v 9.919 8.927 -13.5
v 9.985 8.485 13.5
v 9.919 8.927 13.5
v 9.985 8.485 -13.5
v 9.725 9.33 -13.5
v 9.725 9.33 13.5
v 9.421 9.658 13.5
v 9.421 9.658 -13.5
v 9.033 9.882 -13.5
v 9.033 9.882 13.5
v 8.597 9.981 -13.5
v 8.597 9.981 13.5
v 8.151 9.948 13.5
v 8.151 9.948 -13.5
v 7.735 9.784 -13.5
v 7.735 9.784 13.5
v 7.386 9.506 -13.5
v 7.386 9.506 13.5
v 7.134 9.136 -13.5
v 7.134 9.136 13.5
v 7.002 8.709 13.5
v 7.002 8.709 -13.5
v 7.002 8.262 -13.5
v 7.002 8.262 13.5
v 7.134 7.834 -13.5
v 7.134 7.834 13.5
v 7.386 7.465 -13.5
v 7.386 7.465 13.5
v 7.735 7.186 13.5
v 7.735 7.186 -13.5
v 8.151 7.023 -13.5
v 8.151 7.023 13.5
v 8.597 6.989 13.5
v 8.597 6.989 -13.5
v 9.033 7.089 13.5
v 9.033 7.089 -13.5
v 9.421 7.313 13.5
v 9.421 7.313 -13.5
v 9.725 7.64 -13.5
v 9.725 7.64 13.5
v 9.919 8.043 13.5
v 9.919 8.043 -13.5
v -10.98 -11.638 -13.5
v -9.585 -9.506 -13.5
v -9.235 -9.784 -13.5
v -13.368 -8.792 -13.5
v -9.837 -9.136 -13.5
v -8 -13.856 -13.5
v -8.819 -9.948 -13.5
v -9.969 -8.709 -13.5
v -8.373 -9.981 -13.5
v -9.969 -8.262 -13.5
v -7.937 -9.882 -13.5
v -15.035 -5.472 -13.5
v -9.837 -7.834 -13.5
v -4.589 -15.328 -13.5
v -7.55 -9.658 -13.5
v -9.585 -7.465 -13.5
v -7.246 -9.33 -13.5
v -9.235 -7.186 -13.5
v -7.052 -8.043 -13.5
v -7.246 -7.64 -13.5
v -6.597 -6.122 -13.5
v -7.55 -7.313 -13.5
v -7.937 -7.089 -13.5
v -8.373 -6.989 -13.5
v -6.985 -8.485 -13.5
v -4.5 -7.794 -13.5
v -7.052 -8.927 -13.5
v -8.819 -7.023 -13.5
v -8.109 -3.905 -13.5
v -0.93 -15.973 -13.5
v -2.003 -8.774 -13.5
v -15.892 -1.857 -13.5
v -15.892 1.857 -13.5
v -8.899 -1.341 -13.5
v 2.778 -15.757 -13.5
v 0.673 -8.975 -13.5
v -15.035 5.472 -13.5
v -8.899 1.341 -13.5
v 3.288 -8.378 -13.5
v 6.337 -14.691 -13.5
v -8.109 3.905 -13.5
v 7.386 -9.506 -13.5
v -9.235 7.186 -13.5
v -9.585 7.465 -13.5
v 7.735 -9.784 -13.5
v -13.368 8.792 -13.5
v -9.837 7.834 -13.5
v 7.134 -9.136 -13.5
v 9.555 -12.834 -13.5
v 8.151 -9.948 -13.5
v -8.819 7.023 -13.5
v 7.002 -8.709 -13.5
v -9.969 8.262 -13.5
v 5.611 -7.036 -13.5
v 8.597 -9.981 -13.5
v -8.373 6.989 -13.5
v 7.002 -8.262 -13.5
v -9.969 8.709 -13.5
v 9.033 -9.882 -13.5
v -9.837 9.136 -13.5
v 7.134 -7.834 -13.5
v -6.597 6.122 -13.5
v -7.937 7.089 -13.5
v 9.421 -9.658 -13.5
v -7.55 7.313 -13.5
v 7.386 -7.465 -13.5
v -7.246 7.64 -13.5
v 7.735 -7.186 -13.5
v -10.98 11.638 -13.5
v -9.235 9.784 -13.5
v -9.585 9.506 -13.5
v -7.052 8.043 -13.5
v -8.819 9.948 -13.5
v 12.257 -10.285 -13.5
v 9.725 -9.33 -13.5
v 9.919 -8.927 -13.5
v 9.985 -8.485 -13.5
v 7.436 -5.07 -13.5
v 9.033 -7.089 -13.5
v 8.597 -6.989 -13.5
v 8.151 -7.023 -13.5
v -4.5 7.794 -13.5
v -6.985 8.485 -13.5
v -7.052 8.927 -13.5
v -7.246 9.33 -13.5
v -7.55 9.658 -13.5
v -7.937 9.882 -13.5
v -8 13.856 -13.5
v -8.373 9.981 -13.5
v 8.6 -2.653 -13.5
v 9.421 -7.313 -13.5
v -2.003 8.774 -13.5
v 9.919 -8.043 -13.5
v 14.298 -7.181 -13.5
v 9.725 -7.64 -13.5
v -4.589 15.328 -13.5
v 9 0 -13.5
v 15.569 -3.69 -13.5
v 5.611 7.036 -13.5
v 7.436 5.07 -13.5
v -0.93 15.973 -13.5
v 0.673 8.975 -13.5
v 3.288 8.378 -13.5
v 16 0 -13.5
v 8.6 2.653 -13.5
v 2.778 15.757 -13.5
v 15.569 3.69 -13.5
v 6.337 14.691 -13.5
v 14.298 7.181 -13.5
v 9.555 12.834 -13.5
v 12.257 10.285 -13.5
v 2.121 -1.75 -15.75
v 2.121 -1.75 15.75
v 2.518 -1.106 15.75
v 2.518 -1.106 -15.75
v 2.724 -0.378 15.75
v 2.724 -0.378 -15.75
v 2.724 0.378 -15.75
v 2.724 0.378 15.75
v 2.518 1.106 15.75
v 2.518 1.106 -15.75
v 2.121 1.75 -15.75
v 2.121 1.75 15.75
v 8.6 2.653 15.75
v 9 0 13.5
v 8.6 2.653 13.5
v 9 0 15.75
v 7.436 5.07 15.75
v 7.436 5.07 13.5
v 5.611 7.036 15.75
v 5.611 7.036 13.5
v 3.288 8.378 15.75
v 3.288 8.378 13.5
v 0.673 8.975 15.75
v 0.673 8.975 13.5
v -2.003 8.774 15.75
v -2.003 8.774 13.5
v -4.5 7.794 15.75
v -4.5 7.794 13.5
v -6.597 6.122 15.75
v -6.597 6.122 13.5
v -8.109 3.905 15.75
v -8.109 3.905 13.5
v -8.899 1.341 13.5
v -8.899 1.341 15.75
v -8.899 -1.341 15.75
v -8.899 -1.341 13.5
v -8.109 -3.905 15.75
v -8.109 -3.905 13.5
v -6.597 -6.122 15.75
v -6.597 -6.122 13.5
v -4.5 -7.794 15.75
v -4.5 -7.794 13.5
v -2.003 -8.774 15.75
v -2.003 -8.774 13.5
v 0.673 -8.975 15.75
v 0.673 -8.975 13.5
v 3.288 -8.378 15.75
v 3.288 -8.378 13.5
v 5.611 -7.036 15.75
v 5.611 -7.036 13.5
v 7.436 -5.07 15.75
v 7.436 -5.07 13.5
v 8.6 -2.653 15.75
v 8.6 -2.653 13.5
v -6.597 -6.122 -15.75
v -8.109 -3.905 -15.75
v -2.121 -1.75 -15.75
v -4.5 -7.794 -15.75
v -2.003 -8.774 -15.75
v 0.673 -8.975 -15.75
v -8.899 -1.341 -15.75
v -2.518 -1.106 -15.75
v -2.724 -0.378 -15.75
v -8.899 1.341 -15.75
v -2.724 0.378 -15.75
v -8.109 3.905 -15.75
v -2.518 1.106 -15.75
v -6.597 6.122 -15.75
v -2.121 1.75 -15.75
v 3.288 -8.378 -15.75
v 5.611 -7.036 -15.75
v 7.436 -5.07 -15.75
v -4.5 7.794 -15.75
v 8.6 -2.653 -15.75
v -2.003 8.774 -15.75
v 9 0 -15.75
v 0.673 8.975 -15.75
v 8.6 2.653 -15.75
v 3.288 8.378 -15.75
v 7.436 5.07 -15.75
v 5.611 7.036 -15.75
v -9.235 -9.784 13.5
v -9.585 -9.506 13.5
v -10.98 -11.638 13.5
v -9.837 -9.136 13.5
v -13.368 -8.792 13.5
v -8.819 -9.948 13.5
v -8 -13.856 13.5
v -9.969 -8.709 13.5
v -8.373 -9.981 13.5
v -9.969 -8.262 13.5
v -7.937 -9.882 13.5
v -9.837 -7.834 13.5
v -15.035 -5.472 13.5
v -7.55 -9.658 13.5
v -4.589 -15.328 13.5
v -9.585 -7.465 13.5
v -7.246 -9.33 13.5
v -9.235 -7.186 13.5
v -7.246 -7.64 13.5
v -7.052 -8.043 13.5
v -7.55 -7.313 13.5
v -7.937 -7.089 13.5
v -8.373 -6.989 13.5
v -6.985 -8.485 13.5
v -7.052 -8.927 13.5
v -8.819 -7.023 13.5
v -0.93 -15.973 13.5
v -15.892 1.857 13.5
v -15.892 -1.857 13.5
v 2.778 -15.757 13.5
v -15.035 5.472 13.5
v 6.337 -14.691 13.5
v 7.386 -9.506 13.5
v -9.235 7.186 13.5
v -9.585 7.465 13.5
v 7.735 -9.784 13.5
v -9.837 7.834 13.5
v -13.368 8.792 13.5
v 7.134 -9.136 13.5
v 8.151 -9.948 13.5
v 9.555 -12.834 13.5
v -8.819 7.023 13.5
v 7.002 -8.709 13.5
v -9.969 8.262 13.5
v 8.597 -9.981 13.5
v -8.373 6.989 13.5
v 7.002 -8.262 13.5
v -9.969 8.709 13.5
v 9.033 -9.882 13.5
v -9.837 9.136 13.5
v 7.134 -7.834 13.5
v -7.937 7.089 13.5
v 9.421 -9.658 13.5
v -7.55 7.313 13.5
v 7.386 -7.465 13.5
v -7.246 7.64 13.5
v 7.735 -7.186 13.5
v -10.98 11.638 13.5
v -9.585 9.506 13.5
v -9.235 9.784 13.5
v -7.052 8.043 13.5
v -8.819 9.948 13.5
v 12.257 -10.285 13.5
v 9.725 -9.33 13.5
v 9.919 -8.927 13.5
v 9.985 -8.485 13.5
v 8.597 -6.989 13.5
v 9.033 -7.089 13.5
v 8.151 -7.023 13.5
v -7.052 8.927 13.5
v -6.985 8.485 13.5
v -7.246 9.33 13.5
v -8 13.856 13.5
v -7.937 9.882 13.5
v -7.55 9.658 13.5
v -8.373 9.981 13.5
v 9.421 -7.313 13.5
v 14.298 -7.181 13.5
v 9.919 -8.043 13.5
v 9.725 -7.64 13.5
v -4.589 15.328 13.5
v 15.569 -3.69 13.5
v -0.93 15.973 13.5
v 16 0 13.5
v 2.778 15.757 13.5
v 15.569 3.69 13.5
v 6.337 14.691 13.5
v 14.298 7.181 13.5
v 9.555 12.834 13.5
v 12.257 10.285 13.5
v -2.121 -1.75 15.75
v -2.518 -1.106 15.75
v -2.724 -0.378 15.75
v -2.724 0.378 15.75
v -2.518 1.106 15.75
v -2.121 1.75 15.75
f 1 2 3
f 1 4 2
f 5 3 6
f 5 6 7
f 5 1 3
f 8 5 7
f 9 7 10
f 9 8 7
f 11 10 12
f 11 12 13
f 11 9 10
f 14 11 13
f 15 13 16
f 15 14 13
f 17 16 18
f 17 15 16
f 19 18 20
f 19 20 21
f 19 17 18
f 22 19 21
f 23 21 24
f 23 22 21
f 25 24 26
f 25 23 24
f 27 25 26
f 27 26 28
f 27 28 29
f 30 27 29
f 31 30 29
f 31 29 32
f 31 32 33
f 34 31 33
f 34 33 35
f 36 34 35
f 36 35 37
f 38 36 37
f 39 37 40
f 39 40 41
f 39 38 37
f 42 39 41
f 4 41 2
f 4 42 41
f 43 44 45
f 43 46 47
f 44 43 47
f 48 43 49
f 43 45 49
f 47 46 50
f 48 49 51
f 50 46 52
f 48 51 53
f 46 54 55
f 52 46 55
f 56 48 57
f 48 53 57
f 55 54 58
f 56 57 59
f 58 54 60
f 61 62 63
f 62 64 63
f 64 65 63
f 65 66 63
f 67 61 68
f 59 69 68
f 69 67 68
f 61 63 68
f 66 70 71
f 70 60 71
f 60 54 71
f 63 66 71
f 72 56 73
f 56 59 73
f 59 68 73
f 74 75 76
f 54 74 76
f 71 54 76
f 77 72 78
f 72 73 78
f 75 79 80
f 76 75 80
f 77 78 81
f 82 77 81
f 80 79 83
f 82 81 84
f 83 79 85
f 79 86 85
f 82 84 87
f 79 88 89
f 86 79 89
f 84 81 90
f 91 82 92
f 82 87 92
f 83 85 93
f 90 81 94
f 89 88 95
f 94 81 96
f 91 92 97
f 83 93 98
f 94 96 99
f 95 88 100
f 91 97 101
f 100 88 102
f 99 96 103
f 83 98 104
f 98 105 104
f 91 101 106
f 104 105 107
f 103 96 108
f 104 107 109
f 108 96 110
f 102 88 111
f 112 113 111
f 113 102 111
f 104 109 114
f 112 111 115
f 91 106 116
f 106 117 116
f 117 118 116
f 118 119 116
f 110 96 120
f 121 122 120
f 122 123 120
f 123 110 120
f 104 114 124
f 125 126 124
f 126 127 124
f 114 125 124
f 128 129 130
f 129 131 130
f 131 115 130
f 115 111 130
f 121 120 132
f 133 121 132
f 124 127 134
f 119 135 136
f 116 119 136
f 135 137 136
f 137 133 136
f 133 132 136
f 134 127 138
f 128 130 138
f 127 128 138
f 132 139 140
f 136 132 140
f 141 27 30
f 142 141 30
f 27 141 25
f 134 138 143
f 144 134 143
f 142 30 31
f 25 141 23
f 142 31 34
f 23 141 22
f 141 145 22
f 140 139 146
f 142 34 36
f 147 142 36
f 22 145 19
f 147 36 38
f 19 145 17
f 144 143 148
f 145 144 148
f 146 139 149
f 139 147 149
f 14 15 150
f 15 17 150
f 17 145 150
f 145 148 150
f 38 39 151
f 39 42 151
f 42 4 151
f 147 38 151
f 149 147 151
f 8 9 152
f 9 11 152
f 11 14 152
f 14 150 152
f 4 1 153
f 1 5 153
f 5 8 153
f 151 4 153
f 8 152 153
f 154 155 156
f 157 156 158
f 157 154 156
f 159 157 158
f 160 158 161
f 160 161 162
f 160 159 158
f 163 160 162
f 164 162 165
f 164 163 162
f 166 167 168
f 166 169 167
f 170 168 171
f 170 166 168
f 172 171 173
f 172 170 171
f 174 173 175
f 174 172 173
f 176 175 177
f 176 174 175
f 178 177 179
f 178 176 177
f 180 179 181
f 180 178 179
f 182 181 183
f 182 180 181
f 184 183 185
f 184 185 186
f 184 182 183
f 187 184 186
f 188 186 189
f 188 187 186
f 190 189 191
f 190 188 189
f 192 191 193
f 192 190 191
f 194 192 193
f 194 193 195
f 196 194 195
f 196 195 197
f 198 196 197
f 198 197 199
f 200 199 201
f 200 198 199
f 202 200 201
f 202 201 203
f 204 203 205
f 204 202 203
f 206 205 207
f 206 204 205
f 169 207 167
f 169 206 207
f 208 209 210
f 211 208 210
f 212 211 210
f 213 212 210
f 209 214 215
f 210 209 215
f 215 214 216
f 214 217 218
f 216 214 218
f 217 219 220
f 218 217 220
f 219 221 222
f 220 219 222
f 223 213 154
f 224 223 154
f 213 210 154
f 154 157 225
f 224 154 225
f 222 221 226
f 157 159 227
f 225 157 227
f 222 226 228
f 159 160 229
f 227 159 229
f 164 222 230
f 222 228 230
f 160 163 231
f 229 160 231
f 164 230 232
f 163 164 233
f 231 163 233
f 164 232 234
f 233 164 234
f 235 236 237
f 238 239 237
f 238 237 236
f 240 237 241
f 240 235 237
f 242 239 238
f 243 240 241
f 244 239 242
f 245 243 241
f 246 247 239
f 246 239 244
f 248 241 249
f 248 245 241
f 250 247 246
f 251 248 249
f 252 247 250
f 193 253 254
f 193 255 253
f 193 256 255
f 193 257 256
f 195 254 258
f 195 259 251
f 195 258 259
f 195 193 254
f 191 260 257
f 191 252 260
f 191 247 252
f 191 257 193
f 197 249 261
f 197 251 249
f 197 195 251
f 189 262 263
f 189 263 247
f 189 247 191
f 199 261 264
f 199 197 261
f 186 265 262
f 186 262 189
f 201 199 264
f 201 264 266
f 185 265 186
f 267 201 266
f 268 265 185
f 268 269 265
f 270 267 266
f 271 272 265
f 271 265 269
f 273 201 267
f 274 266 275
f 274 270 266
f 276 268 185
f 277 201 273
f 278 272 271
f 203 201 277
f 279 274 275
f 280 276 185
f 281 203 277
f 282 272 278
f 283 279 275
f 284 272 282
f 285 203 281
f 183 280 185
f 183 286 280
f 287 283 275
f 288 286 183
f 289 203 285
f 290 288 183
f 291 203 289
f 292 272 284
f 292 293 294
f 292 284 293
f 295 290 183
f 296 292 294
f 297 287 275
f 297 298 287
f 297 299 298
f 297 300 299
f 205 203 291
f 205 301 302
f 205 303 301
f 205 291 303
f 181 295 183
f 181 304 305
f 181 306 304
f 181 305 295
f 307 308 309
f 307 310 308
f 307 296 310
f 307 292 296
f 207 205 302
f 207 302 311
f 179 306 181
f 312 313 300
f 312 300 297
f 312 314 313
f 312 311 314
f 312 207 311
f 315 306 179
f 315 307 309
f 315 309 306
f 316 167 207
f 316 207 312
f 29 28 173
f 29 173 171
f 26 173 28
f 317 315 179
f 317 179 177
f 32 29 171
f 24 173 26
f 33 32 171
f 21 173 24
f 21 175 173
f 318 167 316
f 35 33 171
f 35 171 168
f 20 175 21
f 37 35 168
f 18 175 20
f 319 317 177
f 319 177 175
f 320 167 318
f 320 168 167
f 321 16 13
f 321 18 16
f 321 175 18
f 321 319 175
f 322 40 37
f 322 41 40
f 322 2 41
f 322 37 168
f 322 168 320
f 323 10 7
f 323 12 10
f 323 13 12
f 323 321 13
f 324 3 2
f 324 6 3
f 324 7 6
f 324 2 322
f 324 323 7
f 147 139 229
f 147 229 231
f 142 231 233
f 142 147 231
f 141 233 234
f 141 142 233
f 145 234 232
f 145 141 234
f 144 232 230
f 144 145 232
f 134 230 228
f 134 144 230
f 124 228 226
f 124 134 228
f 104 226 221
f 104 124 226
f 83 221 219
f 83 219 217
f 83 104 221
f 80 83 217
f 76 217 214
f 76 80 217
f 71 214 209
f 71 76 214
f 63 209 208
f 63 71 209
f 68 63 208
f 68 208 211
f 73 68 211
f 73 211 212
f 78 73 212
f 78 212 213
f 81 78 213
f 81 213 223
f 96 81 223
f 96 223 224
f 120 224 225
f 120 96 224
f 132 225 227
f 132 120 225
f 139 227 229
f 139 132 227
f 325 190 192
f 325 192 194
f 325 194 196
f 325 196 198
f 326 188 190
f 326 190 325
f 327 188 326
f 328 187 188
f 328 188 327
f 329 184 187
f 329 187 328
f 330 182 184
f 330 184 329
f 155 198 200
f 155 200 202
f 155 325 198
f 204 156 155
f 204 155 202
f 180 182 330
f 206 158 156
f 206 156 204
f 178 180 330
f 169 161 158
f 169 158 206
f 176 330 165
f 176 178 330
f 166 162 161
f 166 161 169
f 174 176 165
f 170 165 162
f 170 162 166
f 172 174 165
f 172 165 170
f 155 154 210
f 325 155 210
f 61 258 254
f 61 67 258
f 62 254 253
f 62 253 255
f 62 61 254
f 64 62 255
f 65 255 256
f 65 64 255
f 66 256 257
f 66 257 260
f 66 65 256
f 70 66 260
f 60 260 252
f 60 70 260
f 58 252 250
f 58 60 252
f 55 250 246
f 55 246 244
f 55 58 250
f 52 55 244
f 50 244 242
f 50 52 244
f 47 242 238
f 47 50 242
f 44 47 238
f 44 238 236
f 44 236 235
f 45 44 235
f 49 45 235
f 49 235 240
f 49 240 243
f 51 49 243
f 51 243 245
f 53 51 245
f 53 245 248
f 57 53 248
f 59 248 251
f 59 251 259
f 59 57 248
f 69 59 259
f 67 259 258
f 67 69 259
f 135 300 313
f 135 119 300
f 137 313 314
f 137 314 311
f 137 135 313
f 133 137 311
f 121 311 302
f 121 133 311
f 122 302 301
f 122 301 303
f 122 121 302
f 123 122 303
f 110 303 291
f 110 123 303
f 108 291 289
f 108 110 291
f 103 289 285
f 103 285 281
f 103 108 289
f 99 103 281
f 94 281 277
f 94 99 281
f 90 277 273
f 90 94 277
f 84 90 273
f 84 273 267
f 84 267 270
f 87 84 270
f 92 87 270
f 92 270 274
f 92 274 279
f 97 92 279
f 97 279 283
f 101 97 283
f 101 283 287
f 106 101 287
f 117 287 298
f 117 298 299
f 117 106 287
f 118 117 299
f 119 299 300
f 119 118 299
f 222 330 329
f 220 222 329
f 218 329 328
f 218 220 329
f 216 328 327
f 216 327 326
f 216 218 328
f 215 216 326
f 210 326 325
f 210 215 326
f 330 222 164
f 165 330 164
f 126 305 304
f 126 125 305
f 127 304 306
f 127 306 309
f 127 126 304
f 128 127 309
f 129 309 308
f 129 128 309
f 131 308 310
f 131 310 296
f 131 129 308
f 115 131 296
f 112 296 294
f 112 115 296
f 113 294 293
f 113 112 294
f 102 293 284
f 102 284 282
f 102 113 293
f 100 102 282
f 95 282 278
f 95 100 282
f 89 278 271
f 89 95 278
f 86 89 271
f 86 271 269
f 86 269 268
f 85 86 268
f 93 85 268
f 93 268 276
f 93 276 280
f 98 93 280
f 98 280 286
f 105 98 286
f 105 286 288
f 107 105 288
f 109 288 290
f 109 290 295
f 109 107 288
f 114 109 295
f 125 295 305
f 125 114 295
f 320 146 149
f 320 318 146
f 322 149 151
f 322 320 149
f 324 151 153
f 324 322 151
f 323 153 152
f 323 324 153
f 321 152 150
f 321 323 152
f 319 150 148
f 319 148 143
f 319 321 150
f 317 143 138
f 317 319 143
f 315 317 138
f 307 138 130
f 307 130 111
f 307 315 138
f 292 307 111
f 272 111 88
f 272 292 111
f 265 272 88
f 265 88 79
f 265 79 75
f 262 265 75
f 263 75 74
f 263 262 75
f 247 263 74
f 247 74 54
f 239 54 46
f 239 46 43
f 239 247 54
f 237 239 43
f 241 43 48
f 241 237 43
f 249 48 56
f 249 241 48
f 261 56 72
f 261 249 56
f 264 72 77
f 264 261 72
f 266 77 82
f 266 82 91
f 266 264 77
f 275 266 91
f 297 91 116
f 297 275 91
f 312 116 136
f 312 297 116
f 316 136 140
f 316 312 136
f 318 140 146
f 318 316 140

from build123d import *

# Parameters (mm, degrees)
SKETCH1_R           = 16
SKETCH1_R_2         = 9
SKETCH1_R_3         = 1.5
BOSS_EXTRUDE3_DEPTH = 13.5
SKETCH1_6_R         = 9
SKETCH1_6_R_2       = 7.5
BOSS_EXTRUDE4_DEPTH = 15.75
BOSS_EXTRUDE6_START = -31.5
SKETCH2_R           = 7.5
SKETCH2_R_2         = 2.75
BOSS_EXTRUDE6_DEPTH = 31.5


with BuildPart() as part:
    # Sketch1 → Boss-Extrude3 (new, symmetric)
    with BuildSketch(Plane.XY):
        Circle(SKETCH1_R)
        Circle(SKETCH1_R_2, mode=Mode.SUBTRACT)
        with Locations((-8.485281374, -8.485281374)):
            Circle(SKETCH1_R_3, mode=Mode.SUBTRACT)
        with Locations((8.485281374, -8.485281374)):
            Circle(SKETCH1_R_3, mode=Mode.SUBTRACT)
        with Locations((8.485281374, 8.485281374)):
            Circle(SKETCH1_R_3, mode=Mode.SUBTRACT)
        with Locations((-8.485281374, 8.485281374)):
            Circle(SKETCH1_R_3, mode=Mode.SUBTRACT)
    extrude(amount=BOSS_EXTRUDE3_DEPTH, both=True)

    # Sketch1<6> → Boss-Extrude4 (add, symmetric)
    with BuildSketch(Plane.XY):
        Circle(SKETCH1_6_R)
        Circle(SKETCH1_6_R_2, mode=Mode.SUBTRACT)
    extrude(amount=BOSS_EXTRUDE4_DEPTH, both=True)

    # Sketch2 → Boss-Extrude6 (add)
    # profile 1 of 3: a face of its own
    with BuildSketch(Plane.XY.offset(15.75).offset(BOSS_EXTRUDE6_START)):
        Circle(SKETCH2_R)
        Circle(SKETCH2_R_2, mode=Mode.SUBTRACT)
    # profile 2 of 3: a face of its own
    with BuildSketch(Plane.XY.offset(15.75).offset(BOSS_EXTRUDE6_START)):
        with BuildLine():
            ThreePointArc((2.121320344, 1.75), (0, 2.75), (-2.121320344, 1.75))
            Line((-2.121320344, 1.75), (2.121320344, 1.75))
        make_face()
    # profile 3 of 3: a face of its own
    with BuildSketch(Plane.XY.offset(15.75).offset(BOSS_EXTRUDE6_START)):
        with BuildLine():
            Line((2.121320344, -1.75), (-2.121320344, -1.75))
            ThreePointArc((-2.121320344, -1.75), (0, -2.75), (2.121320344, -1.75))
        make_face()
    extrude(amount=BOSS_EXTRUDE6_DEPTH)


solid = part.part
